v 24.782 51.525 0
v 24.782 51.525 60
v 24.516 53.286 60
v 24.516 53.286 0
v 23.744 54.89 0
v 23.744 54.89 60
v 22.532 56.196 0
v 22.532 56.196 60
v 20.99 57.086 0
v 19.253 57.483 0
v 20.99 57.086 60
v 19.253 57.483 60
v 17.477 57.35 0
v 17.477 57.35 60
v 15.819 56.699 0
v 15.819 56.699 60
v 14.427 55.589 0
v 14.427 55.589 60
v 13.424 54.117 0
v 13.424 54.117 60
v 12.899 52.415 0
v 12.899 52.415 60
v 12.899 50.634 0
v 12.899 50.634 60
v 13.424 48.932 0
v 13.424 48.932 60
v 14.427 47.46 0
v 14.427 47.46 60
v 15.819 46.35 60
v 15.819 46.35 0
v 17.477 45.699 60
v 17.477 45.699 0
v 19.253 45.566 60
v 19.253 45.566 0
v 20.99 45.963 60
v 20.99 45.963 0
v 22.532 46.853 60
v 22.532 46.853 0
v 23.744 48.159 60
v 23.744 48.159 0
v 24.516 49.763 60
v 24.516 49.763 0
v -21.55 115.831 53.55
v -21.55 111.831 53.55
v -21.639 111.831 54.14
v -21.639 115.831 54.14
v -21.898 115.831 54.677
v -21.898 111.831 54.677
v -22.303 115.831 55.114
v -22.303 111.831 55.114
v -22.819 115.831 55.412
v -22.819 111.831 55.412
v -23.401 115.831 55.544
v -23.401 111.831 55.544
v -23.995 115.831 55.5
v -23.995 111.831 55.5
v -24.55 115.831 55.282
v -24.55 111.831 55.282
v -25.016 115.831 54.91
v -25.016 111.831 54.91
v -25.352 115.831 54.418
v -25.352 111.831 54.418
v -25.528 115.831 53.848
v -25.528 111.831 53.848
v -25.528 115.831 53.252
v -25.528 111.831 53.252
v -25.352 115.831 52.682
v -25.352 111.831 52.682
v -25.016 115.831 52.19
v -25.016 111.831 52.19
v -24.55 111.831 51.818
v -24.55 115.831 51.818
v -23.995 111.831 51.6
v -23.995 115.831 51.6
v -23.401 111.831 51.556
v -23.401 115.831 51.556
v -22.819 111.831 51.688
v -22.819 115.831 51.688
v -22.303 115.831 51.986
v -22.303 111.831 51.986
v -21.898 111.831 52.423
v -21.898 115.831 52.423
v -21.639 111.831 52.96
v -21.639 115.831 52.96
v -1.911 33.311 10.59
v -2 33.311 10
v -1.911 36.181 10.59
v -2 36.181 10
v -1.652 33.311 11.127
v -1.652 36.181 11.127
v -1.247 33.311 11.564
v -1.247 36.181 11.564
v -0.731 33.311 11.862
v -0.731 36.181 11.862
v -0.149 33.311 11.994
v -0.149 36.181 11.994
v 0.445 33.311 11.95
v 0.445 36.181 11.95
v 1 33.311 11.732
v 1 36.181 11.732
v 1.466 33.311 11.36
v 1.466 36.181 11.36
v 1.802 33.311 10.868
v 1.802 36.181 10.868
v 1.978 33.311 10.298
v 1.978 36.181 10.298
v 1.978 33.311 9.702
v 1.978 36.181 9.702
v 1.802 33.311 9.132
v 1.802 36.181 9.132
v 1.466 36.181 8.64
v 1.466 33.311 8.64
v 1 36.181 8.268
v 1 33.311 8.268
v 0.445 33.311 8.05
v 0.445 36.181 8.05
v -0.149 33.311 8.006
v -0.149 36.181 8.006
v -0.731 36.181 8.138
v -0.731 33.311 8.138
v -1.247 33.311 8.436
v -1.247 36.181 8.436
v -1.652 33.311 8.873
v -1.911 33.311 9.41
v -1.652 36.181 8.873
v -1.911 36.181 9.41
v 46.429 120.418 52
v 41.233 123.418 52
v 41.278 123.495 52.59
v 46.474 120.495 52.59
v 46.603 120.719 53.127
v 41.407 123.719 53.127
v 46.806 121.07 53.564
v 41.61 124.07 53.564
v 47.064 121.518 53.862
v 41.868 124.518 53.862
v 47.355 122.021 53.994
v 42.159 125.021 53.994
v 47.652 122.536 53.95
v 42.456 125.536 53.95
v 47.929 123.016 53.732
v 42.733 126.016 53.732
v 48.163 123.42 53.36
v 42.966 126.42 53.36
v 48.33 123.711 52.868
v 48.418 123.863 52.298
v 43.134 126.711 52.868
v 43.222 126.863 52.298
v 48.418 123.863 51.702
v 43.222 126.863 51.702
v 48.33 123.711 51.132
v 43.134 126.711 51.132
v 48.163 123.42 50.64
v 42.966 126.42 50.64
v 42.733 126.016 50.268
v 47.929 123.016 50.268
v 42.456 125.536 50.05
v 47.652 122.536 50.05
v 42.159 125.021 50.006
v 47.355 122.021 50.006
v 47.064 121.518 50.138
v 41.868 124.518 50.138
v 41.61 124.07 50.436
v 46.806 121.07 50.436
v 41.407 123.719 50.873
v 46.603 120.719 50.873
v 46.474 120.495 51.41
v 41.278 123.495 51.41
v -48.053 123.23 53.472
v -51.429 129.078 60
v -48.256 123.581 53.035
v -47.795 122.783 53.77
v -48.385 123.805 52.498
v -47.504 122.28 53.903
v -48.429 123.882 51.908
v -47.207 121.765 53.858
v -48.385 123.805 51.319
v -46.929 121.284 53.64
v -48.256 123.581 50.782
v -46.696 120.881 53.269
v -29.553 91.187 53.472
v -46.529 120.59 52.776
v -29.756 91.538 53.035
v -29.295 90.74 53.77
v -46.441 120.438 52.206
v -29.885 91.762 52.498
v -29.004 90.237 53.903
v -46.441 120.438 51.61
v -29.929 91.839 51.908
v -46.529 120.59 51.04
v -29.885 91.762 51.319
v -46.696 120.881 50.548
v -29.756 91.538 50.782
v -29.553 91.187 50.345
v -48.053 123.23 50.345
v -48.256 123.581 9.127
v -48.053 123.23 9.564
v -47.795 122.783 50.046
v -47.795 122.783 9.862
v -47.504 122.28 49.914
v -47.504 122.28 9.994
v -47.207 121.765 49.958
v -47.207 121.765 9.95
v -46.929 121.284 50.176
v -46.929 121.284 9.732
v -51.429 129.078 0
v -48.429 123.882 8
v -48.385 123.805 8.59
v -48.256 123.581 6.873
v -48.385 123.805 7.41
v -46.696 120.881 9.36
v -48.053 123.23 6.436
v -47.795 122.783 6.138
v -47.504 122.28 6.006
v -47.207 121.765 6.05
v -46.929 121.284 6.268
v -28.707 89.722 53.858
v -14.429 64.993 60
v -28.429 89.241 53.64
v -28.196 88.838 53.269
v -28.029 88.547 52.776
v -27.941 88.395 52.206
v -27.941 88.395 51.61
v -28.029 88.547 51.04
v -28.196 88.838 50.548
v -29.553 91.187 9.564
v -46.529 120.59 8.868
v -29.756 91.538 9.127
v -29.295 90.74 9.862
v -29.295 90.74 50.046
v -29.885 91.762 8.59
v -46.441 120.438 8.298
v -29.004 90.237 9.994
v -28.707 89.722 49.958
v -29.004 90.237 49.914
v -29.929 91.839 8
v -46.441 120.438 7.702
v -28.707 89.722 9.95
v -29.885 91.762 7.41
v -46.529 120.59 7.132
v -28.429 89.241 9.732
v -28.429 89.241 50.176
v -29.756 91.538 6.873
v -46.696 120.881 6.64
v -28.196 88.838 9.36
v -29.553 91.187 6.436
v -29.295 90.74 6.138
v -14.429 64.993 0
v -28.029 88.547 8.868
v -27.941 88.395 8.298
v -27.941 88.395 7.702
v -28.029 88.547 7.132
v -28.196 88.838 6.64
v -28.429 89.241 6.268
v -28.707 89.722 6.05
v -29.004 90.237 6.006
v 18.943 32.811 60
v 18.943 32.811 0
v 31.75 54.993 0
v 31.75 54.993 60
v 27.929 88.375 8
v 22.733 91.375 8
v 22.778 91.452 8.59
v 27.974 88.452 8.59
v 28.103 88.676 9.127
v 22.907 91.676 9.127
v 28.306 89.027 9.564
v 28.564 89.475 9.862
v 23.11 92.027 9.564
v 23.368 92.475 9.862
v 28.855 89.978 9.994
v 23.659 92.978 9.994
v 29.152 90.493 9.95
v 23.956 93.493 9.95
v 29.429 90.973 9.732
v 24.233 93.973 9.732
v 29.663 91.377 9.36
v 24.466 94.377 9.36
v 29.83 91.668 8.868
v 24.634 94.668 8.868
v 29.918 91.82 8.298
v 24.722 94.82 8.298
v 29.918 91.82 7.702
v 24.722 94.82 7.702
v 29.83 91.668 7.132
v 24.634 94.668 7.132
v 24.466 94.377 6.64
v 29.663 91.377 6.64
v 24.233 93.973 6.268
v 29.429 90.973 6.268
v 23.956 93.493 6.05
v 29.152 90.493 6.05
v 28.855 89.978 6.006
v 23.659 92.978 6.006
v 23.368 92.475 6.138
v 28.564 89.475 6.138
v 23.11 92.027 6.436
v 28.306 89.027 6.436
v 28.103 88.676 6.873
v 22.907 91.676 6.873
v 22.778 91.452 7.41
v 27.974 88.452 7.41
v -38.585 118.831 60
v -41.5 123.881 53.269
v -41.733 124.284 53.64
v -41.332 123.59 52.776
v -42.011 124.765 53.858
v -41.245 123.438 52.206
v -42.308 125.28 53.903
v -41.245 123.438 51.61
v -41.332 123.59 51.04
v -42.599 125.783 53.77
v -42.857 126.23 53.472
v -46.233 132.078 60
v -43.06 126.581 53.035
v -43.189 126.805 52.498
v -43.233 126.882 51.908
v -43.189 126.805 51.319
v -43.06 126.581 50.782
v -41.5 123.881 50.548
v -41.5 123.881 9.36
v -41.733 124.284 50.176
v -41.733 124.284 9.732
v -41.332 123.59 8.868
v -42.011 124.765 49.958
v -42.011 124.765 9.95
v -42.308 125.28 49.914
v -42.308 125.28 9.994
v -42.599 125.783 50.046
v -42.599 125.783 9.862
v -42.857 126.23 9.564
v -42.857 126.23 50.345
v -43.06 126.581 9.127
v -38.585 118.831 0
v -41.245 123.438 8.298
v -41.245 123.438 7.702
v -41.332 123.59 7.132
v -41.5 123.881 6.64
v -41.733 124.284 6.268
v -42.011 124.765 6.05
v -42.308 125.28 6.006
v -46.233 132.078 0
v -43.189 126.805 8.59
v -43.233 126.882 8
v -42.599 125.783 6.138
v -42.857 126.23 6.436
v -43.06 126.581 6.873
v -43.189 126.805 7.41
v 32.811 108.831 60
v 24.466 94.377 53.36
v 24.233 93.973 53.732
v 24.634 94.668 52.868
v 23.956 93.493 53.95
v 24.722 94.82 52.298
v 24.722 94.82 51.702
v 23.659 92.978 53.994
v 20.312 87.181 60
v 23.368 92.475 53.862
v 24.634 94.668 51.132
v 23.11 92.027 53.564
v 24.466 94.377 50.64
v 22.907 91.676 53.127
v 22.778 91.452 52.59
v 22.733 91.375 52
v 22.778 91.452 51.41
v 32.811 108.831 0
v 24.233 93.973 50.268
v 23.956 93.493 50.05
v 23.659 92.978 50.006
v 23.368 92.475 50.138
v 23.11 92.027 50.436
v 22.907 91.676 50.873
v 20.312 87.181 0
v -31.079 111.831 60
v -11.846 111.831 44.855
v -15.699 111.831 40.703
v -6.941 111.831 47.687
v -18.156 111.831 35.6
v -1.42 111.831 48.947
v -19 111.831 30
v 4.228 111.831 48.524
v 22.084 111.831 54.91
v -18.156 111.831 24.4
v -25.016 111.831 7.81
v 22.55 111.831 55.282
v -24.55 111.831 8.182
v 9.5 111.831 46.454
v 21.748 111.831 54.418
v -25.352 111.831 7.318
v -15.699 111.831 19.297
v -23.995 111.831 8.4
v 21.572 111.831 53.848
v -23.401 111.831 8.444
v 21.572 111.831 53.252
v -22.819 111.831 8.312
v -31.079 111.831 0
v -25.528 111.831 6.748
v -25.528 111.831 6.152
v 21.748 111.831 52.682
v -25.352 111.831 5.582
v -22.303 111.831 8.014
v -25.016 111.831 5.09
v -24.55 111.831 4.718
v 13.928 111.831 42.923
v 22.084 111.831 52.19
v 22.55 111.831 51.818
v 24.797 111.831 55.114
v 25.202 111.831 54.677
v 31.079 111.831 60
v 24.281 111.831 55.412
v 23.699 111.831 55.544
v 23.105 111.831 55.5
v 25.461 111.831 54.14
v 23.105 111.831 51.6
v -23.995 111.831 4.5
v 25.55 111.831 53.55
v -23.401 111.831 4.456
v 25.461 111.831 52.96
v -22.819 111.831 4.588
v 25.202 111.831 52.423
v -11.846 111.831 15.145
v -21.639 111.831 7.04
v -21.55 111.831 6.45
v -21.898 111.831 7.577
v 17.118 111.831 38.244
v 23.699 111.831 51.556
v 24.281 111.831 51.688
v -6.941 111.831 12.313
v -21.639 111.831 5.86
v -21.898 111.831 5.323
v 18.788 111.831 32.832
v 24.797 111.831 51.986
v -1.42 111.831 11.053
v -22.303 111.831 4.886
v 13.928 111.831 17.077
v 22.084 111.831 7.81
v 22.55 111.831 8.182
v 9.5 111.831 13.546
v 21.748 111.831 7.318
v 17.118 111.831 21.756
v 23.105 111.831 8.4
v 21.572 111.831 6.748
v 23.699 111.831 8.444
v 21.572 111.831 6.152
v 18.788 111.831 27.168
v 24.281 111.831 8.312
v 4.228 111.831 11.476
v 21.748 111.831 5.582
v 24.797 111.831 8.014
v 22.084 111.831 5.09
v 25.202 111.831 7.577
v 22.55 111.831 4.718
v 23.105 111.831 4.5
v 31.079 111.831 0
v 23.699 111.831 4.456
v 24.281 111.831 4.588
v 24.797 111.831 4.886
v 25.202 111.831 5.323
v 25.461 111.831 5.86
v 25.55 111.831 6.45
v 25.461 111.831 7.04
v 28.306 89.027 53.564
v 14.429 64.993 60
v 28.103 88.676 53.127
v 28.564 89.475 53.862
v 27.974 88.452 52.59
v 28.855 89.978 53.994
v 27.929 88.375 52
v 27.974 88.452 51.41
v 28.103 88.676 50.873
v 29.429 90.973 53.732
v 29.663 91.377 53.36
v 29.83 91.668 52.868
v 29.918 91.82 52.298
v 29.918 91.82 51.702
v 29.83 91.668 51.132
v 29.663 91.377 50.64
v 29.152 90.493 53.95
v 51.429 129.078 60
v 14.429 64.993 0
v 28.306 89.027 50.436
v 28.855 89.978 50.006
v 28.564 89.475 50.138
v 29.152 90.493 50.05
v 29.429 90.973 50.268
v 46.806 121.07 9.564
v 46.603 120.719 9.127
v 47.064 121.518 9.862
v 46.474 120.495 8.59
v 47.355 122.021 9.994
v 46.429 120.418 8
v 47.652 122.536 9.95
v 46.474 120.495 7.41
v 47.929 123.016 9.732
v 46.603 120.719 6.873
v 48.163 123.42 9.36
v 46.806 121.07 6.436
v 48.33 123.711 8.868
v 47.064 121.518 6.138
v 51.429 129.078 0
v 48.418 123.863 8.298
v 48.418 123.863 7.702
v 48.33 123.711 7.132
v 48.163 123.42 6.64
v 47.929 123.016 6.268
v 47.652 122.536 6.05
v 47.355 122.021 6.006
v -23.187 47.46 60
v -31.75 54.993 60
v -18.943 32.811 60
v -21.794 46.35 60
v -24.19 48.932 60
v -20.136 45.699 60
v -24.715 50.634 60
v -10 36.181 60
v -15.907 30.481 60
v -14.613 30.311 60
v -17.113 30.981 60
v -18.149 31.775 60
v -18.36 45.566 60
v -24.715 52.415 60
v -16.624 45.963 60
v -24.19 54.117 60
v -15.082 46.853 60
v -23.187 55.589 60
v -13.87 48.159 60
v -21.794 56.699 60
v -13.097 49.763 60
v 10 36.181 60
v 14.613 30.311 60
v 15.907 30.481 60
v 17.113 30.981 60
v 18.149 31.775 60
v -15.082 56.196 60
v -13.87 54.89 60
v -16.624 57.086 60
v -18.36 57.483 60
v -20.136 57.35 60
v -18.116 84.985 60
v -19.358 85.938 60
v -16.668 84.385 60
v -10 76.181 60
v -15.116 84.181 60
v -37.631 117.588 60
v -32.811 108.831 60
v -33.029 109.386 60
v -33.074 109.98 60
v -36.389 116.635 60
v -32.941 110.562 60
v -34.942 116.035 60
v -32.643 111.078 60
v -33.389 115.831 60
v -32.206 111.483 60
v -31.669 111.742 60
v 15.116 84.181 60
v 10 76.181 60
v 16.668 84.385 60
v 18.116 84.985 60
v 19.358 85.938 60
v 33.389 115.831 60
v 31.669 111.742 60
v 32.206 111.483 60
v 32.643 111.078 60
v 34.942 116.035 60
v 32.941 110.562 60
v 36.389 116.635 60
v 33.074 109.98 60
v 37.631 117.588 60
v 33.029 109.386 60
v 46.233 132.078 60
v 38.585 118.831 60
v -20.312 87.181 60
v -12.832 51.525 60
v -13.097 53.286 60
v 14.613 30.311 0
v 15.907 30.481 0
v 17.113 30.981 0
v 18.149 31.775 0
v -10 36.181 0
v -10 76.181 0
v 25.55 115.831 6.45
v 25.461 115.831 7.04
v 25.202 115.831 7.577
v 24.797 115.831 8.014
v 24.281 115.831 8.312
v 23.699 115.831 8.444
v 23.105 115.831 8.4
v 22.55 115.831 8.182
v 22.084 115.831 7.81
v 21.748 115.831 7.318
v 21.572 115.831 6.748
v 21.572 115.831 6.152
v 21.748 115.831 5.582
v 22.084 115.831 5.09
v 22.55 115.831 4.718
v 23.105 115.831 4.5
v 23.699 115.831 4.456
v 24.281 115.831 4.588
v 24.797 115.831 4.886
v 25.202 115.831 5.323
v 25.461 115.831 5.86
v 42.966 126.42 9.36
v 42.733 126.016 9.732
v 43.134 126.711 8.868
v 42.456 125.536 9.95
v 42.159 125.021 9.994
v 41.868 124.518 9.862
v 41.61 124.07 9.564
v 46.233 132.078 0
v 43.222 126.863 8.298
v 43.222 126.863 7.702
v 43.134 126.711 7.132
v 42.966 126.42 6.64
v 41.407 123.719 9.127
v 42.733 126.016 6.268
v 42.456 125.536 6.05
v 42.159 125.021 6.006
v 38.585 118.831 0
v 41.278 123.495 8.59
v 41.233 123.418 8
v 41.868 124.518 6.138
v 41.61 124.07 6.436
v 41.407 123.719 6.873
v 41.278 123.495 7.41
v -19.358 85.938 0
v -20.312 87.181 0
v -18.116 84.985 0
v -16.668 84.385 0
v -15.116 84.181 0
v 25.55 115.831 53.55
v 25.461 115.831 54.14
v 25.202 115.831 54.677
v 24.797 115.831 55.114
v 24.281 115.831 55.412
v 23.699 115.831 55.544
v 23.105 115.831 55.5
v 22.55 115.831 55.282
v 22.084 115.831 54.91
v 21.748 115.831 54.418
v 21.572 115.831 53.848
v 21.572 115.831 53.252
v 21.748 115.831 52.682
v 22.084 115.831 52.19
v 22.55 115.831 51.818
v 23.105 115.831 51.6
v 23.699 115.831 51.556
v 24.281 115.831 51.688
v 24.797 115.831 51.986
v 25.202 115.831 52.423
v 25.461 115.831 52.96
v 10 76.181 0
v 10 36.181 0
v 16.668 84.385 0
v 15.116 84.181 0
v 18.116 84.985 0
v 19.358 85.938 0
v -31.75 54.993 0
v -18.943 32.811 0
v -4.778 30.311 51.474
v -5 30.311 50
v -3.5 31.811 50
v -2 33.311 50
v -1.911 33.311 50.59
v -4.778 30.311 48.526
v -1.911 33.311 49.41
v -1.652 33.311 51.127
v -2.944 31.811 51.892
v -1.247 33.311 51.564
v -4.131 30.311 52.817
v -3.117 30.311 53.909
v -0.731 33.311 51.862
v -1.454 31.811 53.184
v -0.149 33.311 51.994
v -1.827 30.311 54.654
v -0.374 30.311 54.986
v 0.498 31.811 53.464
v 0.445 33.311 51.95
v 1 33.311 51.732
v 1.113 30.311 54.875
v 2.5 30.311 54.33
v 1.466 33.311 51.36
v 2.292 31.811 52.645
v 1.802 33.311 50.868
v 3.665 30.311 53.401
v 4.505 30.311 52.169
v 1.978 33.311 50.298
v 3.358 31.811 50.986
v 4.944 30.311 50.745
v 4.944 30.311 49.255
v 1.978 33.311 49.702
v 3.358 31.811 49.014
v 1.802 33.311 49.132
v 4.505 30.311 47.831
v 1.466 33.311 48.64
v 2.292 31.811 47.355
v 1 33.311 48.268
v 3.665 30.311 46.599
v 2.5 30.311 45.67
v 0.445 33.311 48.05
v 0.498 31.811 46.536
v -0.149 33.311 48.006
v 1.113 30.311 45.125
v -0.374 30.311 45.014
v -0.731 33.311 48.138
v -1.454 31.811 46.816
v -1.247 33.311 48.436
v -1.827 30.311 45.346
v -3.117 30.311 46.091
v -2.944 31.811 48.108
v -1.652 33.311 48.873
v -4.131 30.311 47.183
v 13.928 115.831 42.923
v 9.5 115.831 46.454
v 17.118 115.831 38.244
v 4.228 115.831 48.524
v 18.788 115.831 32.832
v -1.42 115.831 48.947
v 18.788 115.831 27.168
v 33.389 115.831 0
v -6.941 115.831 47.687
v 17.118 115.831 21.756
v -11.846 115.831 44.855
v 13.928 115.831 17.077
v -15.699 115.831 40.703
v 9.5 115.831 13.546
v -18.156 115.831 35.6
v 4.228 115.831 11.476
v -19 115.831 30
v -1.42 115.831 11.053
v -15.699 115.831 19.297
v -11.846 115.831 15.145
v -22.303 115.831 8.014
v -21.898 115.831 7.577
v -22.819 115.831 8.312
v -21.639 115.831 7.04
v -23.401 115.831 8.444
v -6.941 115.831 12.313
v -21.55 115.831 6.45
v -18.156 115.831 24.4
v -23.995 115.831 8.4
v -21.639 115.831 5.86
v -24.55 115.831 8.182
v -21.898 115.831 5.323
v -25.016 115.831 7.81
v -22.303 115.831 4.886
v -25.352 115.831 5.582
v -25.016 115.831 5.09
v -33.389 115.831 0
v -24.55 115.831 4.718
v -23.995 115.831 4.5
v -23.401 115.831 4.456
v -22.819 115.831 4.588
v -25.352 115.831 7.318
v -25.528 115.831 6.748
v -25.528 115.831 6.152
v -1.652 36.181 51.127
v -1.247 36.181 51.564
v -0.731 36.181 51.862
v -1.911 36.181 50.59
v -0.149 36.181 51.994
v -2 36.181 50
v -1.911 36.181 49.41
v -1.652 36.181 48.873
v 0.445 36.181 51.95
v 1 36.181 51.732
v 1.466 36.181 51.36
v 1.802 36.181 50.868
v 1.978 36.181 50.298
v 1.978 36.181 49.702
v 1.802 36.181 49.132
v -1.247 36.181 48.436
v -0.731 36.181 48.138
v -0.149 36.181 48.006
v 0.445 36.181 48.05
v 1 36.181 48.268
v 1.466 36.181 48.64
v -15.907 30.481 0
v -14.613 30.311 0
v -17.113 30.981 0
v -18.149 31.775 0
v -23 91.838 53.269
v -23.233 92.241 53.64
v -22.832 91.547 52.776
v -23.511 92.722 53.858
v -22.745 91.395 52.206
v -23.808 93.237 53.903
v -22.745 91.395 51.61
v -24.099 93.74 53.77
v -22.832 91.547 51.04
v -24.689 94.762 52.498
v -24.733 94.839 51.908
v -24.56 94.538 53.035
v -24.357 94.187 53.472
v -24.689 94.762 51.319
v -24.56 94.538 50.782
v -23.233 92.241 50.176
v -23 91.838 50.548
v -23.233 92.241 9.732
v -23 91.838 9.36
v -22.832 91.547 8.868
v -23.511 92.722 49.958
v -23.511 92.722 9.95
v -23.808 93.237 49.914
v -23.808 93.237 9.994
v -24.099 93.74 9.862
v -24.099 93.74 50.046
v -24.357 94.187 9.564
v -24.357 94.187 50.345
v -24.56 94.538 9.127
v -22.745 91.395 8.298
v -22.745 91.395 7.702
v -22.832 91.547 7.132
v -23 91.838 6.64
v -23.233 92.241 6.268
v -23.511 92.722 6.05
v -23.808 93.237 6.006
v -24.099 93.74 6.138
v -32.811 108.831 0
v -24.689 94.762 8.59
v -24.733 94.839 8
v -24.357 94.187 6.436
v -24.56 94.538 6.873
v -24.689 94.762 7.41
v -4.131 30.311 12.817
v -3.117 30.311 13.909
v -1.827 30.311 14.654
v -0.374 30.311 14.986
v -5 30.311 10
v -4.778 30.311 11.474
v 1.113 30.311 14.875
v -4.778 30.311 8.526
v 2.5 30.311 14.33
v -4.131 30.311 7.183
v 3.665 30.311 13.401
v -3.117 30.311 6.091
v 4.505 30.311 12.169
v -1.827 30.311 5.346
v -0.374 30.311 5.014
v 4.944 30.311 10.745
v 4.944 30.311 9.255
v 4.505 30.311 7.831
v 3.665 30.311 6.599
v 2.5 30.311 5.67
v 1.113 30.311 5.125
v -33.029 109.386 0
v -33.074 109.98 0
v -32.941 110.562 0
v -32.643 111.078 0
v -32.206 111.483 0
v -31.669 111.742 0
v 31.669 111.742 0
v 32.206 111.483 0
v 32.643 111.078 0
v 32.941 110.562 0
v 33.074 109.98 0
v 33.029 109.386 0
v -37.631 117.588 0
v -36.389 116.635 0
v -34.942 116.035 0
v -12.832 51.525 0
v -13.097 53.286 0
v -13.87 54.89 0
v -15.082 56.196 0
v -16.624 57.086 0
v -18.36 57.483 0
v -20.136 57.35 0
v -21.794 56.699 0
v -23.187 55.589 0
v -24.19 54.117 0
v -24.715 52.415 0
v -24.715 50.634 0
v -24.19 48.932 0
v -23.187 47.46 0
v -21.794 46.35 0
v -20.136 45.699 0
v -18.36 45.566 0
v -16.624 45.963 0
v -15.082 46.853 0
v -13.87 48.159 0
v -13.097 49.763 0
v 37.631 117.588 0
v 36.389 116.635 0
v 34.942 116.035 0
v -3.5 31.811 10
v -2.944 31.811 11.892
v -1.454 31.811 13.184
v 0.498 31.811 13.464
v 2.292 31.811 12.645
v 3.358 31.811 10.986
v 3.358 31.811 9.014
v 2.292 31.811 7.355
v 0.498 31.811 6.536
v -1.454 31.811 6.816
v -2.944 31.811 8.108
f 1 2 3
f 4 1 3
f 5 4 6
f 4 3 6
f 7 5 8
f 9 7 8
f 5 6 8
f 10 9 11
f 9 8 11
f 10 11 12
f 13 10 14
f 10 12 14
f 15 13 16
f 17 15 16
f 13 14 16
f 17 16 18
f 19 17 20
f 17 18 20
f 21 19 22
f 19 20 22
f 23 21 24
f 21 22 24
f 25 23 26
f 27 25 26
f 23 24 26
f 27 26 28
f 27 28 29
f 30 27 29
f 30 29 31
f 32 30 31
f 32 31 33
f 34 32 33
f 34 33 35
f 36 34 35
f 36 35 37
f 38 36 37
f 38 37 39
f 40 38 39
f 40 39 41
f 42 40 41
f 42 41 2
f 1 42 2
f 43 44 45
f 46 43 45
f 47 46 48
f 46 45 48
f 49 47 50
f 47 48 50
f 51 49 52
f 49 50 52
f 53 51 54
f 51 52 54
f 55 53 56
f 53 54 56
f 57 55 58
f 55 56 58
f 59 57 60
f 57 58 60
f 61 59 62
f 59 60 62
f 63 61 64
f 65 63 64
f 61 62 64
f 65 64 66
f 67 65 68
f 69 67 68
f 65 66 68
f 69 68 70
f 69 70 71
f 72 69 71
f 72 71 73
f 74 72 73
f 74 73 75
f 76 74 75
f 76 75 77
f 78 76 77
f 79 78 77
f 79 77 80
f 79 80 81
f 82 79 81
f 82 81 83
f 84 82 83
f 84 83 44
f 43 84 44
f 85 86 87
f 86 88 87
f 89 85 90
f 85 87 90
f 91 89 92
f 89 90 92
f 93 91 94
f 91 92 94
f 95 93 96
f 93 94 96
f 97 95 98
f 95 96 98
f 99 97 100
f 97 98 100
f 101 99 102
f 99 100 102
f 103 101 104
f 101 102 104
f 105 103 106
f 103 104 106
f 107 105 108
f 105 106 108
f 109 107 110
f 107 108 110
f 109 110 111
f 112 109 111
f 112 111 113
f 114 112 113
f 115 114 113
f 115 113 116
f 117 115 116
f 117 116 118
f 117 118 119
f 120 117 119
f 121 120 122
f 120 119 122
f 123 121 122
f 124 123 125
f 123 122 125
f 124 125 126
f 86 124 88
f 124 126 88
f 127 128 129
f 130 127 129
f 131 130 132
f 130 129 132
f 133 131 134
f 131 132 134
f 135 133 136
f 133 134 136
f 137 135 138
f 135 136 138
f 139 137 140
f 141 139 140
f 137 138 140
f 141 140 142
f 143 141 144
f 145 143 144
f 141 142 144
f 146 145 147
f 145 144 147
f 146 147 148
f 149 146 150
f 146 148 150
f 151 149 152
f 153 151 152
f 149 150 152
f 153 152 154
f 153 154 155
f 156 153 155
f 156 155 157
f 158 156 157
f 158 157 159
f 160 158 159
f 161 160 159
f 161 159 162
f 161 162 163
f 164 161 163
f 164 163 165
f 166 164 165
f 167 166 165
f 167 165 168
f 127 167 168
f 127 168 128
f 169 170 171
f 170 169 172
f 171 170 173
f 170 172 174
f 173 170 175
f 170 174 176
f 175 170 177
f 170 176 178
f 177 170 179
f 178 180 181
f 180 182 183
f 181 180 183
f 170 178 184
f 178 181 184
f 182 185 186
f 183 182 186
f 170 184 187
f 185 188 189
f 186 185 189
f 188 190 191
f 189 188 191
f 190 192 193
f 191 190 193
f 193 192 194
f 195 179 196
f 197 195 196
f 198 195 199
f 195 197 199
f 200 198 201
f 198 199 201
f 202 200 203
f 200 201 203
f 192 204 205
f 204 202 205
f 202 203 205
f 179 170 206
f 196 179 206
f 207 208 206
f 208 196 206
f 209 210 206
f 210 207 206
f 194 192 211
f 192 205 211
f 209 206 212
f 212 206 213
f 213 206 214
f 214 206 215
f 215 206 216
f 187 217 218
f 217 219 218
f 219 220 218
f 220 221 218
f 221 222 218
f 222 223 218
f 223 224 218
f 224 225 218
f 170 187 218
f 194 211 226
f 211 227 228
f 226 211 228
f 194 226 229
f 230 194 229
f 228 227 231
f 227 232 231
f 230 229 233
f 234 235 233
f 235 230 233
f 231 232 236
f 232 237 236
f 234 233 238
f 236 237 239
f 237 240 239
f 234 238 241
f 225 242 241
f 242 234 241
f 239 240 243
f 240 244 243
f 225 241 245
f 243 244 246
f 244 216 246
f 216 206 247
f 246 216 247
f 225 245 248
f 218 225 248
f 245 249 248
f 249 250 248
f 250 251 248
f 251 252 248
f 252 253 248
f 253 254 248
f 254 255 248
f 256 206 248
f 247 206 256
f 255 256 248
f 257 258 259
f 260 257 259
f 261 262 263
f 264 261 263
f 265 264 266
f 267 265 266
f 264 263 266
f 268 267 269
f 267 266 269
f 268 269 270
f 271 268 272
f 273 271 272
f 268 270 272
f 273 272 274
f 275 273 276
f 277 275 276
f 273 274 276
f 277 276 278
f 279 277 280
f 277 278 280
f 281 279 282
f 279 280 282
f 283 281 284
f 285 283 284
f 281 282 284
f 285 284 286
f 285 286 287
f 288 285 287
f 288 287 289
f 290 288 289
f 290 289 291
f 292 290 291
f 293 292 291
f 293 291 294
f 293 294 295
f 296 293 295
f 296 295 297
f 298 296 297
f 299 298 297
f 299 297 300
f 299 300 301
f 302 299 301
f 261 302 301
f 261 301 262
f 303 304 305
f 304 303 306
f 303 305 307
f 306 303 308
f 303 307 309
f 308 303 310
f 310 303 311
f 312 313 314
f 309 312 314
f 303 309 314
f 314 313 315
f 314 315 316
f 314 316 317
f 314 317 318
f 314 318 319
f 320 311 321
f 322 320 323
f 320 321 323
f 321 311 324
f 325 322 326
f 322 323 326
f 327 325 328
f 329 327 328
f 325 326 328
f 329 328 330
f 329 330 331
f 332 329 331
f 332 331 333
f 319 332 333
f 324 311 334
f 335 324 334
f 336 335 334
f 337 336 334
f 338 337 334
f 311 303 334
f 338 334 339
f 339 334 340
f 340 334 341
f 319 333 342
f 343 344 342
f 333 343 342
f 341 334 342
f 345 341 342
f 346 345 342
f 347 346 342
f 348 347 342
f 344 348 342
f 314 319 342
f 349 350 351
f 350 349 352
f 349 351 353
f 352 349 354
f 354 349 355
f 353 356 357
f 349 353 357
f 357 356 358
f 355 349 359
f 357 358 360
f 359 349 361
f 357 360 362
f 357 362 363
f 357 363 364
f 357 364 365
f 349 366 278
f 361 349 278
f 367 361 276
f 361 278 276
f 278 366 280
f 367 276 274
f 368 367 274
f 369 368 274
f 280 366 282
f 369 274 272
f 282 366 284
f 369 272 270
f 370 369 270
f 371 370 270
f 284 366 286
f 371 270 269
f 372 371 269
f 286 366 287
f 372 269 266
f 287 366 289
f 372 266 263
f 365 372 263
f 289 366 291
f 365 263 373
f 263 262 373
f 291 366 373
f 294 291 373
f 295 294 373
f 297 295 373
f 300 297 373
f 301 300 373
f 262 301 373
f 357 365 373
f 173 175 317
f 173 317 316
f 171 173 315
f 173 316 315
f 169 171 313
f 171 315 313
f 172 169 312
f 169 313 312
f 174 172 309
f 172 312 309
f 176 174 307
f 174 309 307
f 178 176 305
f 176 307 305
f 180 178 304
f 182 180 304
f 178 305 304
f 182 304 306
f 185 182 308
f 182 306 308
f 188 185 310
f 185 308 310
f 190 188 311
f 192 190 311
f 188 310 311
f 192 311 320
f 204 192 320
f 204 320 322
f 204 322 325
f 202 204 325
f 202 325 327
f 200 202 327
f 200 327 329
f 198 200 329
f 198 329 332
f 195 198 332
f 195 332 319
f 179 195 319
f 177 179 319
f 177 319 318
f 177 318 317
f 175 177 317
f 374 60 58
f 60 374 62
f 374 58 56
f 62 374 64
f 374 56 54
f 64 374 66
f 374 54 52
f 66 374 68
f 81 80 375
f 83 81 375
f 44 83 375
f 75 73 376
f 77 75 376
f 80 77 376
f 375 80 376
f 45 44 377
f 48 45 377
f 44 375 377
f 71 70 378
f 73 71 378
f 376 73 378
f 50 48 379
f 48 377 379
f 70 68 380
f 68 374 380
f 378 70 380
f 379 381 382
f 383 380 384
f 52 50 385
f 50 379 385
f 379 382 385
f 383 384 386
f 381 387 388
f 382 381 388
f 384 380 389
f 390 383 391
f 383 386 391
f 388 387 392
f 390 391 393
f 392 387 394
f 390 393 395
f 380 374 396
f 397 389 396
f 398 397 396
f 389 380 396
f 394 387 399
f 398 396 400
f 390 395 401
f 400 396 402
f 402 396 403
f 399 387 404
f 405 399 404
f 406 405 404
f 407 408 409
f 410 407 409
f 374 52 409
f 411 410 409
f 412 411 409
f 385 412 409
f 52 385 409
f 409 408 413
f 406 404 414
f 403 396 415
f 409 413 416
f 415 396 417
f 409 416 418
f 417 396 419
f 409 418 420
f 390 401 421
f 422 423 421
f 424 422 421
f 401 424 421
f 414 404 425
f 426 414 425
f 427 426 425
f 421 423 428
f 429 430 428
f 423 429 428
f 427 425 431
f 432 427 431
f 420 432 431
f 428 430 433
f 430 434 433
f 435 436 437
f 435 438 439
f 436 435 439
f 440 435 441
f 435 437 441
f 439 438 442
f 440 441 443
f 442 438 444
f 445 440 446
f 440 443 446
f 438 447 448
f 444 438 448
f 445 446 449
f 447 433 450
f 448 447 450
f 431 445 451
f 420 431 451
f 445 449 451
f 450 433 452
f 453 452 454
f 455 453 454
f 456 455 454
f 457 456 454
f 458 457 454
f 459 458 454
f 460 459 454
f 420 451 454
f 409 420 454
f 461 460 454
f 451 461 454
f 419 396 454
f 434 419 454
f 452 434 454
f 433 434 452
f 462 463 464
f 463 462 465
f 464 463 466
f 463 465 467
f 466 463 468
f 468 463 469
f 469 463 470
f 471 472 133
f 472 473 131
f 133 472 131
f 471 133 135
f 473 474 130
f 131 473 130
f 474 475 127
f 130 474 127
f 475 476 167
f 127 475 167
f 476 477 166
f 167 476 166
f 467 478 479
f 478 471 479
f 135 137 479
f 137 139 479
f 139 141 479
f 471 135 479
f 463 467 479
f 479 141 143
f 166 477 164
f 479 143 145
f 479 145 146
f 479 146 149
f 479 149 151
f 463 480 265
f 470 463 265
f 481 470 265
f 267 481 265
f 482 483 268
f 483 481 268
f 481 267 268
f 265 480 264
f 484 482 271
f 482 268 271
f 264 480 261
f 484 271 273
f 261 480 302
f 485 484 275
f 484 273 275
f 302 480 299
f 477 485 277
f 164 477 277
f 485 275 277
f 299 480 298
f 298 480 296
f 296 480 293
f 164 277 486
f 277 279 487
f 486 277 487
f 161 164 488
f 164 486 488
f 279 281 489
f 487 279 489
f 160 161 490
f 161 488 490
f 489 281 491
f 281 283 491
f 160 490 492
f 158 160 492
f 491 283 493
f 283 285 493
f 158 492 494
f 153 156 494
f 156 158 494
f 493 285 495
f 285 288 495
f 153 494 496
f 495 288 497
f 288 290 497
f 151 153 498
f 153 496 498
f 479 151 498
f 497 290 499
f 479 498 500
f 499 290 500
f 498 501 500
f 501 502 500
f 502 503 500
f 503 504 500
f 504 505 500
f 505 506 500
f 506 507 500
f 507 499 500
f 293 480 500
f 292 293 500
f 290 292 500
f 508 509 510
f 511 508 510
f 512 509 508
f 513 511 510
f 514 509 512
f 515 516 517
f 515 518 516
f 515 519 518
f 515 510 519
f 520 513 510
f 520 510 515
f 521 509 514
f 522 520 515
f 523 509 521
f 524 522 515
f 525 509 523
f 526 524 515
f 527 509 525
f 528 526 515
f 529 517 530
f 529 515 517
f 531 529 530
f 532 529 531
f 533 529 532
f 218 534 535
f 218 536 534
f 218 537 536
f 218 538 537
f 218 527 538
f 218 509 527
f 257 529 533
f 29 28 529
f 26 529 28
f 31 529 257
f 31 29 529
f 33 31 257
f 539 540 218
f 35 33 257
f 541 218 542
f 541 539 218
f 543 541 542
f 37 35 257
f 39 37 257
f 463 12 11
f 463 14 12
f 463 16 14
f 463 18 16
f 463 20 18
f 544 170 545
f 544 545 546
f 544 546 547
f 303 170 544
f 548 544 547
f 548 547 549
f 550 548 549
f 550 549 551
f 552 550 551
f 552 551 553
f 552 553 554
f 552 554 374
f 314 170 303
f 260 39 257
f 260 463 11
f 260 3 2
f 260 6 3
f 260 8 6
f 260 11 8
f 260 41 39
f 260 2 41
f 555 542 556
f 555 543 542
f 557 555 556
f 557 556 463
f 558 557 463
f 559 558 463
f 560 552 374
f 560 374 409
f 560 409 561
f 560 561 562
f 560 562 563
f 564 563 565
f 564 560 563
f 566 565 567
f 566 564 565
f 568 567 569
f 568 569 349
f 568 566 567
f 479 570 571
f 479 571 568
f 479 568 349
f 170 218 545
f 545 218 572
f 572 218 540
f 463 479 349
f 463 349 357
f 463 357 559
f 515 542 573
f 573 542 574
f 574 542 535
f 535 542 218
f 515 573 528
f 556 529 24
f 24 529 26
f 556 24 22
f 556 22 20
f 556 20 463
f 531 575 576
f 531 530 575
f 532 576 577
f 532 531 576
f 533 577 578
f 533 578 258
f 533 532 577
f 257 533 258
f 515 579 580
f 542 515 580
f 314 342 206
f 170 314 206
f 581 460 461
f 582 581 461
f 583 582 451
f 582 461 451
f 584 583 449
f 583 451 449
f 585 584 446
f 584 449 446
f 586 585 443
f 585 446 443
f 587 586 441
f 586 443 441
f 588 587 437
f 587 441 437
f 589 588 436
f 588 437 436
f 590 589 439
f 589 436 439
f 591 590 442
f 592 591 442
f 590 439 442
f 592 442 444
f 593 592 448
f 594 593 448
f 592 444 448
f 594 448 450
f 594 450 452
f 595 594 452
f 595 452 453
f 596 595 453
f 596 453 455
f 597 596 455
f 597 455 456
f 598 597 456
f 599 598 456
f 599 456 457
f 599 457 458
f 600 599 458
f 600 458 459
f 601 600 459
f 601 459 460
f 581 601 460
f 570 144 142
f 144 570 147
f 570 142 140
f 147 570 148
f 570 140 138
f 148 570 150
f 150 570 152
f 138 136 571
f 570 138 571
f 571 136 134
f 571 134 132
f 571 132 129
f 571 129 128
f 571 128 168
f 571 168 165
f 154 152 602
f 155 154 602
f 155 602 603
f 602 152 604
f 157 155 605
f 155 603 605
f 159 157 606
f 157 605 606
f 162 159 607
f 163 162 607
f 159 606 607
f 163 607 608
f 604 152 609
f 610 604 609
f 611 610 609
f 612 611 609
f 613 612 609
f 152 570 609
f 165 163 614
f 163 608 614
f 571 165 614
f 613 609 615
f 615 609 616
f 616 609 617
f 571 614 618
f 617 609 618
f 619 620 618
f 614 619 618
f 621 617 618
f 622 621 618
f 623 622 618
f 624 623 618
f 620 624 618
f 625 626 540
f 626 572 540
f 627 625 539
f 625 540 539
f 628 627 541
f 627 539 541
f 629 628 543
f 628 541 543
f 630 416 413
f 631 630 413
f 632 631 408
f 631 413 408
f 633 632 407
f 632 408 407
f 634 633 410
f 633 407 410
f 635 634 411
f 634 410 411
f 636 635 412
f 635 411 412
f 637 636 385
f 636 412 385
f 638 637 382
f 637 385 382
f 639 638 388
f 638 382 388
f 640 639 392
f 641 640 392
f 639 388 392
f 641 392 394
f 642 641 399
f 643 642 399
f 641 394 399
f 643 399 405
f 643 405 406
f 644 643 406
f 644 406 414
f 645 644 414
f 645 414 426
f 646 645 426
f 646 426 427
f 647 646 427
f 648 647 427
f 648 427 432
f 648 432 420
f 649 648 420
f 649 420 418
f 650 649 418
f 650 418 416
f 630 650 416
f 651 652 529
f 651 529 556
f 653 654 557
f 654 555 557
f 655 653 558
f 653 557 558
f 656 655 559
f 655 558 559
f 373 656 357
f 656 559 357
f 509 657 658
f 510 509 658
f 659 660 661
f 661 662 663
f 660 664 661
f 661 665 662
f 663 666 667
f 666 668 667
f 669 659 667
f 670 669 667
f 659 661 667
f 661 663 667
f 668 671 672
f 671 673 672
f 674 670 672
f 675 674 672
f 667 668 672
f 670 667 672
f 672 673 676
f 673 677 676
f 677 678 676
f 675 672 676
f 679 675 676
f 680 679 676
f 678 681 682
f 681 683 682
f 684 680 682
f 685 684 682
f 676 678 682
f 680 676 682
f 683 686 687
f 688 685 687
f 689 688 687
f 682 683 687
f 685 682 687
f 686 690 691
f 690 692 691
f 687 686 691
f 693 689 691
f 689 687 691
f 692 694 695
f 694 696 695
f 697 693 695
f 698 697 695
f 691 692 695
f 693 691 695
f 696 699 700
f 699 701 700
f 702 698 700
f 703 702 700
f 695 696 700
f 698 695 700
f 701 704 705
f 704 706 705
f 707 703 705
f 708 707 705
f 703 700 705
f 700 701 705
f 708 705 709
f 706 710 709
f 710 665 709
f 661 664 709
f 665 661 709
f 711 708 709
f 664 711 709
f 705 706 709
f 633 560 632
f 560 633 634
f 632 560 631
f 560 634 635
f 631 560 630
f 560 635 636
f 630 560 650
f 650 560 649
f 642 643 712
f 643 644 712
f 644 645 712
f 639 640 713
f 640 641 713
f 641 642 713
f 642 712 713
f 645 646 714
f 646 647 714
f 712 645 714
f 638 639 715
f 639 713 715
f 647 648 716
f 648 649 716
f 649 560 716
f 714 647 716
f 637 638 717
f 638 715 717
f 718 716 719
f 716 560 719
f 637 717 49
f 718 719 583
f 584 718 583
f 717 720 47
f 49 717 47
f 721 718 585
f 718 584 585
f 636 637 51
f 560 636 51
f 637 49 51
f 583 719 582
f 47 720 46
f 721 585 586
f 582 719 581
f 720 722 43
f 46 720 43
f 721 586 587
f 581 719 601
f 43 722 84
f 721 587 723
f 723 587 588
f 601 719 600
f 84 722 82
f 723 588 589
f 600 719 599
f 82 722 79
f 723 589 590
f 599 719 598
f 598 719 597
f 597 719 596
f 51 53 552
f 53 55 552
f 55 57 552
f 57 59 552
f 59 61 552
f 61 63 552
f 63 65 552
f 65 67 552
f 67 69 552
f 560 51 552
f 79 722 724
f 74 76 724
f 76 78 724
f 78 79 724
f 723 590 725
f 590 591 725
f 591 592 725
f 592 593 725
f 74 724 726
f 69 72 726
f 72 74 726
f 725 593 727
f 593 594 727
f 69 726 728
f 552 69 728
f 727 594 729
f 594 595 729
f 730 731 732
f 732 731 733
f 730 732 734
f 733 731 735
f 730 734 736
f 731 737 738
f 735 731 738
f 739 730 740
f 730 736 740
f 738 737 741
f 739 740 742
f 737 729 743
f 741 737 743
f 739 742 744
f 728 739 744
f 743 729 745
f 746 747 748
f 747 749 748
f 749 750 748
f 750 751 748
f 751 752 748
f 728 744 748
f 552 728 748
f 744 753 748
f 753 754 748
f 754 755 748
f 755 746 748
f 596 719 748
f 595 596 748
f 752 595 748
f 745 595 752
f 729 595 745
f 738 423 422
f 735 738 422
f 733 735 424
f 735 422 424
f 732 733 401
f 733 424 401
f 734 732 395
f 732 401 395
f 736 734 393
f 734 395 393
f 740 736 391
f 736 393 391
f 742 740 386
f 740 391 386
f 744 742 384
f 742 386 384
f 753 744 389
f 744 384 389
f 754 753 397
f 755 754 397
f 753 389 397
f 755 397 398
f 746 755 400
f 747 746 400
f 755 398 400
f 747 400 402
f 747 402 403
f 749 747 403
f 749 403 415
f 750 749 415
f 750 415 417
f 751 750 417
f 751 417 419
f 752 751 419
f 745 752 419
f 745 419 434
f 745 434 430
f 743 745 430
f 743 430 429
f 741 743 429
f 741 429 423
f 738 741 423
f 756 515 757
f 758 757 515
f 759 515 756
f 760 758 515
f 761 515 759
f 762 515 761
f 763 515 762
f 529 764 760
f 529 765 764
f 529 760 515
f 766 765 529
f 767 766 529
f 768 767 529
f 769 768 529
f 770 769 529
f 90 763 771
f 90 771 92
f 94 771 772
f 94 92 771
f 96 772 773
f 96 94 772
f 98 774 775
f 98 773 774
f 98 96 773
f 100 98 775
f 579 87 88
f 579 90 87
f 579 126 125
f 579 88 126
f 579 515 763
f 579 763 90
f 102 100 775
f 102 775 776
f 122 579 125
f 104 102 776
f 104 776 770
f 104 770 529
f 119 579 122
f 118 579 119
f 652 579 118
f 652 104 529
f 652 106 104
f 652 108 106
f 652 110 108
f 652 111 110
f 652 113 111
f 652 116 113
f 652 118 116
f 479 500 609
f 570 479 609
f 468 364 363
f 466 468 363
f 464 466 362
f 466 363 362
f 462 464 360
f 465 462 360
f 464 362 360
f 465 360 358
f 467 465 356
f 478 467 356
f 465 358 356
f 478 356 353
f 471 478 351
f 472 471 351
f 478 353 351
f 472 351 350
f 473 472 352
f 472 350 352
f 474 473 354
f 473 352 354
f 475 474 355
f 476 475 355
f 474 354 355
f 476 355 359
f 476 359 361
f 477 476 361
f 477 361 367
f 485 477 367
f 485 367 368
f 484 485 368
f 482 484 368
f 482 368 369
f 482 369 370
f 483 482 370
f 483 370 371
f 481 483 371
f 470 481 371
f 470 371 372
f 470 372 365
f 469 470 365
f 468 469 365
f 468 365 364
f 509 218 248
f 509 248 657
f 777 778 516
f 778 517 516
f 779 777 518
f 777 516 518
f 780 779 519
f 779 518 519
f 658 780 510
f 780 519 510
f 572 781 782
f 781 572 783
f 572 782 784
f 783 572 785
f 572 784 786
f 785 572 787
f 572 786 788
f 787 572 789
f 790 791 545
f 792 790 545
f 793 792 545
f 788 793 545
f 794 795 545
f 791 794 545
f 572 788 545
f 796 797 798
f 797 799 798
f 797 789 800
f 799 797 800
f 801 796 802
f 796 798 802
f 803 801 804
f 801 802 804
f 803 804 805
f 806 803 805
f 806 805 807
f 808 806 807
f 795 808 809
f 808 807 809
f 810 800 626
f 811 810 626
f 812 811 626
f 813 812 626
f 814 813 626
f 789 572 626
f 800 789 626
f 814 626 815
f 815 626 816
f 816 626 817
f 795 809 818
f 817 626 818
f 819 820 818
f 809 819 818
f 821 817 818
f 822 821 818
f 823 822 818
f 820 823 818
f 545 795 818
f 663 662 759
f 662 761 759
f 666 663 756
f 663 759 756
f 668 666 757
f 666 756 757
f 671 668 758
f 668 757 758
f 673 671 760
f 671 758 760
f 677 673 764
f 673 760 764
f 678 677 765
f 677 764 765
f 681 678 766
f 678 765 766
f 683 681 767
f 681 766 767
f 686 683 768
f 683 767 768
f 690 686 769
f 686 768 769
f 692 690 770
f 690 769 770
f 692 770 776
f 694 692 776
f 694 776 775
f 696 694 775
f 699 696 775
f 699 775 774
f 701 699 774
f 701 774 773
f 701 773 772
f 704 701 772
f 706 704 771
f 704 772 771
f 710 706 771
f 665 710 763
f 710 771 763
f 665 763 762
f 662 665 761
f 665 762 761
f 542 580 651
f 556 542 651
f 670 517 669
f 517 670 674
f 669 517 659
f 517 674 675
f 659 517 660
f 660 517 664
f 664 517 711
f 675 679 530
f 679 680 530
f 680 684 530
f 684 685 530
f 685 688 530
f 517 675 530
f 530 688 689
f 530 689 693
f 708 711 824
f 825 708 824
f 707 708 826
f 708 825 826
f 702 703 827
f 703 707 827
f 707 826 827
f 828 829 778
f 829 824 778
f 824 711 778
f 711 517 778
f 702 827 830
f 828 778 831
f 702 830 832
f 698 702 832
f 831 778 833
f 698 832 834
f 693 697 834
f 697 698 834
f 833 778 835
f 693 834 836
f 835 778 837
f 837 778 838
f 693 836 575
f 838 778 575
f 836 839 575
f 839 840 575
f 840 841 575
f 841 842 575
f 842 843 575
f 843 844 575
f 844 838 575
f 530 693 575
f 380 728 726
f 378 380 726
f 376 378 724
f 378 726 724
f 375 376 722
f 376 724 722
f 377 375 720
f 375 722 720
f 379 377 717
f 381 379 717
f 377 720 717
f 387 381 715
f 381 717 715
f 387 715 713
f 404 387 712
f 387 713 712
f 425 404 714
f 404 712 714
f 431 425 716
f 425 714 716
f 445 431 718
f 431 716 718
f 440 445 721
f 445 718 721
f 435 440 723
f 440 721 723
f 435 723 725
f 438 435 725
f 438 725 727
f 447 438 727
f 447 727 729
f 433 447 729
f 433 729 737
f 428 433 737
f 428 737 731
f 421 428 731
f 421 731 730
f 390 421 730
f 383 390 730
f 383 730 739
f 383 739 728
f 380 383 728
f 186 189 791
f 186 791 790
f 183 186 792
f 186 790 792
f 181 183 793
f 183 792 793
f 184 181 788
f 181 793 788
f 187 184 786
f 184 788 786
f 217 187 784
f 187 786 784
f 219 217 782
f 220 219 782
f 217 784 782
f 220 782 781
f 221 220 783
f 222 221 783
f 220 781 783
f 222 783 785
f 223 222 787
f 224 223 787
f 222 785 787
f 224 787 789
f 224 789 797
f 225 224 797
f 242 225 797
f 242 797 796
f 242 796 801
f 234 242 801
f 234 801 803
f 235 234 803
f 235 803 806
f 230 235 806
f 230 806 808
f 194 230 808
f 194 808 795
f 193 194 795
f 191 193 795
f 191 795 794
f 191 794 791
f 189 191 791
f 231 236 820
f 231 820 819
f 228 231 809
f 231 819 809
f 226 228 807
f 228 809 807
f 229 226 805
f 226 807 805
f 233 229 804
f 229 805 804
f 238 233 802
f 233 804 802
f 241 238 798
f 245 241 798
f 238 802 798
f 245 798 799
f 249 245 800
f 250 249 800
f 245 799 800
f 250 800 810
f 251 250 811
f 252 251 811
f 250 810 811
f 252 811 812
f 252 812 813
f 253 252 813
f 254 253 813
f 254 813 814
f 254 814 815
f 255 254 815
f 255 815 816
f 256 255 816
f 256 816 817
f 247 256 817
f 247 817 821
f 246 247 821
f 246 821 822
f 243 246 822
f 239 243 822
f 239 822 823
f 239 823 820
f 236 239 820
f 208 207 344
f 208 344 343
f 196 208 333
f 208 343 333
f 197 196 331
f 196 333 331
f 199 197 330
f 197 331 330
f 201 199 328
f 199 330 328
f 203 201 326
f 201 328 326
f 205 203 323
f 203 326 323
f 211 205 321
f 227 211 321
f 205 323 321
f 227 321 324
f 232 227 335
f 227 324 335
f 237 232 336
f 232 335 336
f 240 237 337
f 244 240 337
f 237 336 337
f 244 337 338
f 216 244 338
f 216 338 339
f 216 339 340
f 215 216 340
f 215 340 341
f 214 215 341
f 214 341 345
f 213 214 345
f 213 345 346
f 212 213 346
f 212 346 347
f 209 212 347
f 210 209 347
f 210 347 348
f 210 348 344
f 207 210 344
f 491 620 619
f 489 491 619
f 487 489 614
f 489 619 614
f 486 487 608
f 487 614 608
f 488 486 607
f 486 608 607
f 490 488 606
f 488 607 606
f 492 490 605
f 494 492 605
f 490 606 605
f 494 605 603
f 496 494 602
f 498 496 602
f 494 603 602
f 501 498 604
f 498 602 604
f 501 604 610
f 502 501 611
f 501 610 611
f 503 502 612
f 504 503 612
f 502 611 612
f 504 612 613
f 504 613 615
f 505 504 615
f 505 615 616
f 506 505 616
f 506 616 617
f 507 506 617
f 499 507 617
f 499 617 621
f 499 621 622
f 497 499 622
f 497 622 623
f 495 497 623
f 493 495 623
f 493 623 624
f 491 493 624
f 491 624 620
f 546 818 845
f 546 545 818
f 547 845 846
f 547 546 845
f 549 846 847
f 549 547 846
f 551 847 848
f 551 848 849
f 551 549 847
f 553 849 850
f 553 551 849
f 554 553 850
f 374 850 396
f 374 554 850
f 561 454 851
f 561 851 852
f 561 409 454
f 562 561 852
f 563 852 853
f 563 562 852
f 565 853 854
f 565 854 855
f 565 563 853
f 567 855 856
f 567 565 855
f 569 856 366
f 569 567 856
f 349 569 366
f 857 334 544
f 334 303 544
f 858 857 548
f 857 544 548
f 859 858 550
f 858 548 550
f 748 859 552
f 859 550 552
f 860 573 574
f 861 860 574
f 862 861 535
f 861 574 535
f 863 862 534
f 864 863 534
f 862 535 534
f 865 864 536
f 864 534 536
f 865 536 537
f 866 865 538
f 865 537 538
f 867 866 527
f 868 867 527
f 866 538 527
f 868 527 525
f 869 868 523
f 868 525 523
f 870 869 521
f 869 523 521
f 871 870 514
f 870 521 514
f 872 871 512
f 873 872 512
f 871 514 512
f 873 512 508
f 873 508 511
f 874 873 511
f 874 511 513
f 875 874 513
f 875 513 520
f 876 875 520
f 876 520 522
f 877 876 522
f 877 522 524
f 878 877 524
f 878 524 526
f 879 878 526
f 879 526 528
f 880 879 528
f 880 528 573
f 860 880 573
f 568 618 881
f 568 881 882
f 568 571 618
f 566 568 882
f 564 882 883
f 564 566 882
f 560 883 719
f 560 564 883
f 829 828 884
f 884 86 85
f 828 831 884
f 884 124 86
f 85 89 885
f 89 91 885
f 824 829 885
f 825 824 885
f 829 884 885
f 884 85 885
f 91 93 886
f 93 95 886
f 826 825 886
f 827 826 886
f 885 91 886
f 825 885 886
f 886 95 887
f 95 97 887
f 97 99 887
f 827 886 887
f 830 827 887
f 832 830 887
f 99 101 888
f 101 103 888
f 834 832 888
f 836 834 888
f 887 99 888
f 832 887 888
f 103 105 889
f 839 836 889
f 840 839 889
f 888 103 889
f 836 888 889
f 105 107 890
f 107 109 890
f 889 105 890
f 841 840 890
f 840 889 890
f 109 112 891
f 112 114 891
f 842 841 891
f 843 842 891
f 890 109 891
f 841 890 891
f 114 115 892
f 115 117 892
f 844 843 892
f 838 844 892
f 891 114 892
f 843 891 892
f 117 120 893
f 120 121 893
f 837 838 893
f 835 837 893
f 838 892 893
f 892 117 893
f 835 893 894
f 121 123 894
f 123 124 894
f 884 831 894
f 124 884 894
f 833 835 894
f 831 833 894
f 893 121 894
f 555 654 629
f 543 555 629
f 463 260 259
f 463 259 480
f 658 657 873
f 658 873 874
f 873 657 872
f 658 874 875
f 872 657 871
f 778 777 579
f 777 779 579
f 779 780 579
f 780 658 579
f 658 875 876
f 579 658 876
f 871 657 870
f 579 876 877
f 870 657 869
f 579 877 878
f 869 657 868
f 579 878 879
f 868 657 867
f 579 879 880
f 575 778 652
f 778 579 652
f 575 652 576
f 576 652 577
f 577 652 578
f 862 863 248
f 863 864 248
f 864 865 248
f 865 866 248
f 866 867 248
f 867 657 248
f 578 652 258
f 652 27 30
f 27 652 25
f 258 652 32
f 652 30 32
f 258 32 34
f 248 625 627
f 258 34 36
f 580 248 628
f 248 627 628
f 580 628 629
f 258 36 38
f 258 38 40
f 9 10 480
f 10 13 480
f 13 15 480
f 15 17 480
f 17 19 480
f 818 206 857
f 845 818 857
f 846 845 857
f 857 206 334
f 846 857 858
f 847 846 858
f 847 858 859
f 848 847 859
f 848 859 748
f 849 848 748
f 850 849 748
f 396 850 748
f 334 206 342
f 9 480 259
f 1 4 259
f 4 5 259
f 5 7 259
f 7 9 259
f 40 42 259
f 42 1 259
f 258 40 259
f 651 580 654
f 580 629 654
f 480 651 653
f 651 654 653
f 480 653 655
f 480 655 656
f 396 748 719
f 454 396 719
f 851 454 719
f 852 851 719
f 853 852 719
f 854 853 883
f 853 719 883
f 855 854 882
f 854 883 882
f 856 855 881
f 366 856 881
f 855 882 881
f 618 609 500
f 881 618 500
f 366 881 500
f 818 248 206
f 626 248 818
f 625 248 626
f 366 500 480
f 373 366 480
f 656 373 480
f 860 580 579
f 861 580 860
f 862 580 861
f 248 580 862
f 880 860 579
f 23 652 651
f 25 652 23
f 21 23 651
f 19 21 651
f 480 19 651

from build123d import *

# Parameters (mm, degrees)
F0_W            = 20
F0_H            = 40
F1_DEPTH        = 60
F2_R            = 5
F3_R            = 6
F4_R            = 2
F5_R            = 5.975
F6_DEPTH        = 60.001
F8_D            = 4
F8_DEPTH        = 12
F8_TIP          = 1.2017212381
F9_R            = 19
F10_DEPTH       = 25
F12_D           = 4
F12_DEPTH       = 12
F12_TIP         = 1.2017212381
F14_D           = 4
F14_DEPTH       = 12
F14_TIP         = 1.2017212381
F16_D           = 4
F16_DEPTH       = 12
F16_CSINK_D     = 10
F16_CSINK_ANGLE = 90
F16_TIP         = 1.2017212381


with BuildPart() as f1:
    # F0 (on Top) → F1 (new body)
    with BuildSketch(Plane.XY):
        Polygon((-17.5, 30.3108891325), (17.5, 30.3108891325), (31.75, 54.9926131403), (14.4294919243, 64.9926131403), (51.4294919243, 129.0784930204), (46.2333395016, 132.0784930204), (36.8527810232, 115.8308891325), (-36.8527810232, 115.8308891325), (-46.2333395016, 132.0784930204), (-51.4294919243, 129.0784930204), (-14.4294919243, 64.9926131403), (-31.75, 54.9926131403), align=None)
        with Locations((0, 56.1808891325)):
            Rectangle(F0_W, F0_H, mode=Mode.SUBTRACT)
        Polygon((34.5433799465, 111.8308891325), (18.5796450034, 84.1808891325), (-18.5796450034, 84.1808891325), (-34.5433799465, 111.8308891325), align=None, mode=Mode.SUBTRACT)
    extrude(amount=F1_DEPTH)

    # F2
    f2_edges = [f1.edges().sort_by_distance(p)[0] for p in [
        (-17.5, 30.310889, 30),
        (17.5, 30.310889, 30),
    ]]
    fillet(f2_edges, radius=F2_R)

    # F3
    f3_edges = [f1.edges().sort_by_distance(p)[0] for p in [
        (18.579645, 84.180889, 30),
        (-18.579645, 84.180889, 30),
        (-36.852781, 115.830889, 30),
        (36.852781, 115.830889, 30),
    ]]
    fillet(f3_edges, radius=F3_R)

    # F4
    f4_edges = [f1.edges().sort_by_distance(p)[0] for p in [
        (34.54338, 111.830889, 30),
        (-34.54338, 111.830889, 30),
    ]]
    fillet(f4_edges, radius=F4_R)

    # F5 (on face) → F6 (cut, through all)
    with BuildSketch(Plane.XY.offset(60)):
        with Locations((-18.8069092991, 51.5245224395)):
            Circle(F5_R)
        with Locations((18.8069092991, 51.5245224395)):
            Circle(F5_R)
    extrude(amount=-F6_DEPTH, mode=Mode.SUBTRACT)

    # F8
    with Locations(Plane(origin=(0, 115.8308891325, 0), x_dir=(-1, 0, 0), z_dir=(0, 1, 0))):
        with Locations((-23.55, 53.55), (-23.55, 6.45), (23.55, 6.45), (23.55, 53.55)):
            Hole(F8_D / 2, depth=F8_DEPTH)
            with Locations((0, 0, -(F8_DEPTH + F8_TIP / 2))):  # 118° drill point
                Cone(0, F8_D / 2, F8_TIP, mode=Mode.SUBTRACT)

    # F9 (on face) → F10 (cut)
    with BuildSketch(Plane(origin=(0, 115.8308891325, 0), x_dir=(-1, 0, 0), z_dir=(0, 1, 0))):
        with Locations((0, 30)):
            Circle(F9_R)
    extrude(amount=-F10_DEPTH, mode=Mode.SUBTRACT)

    # F12
    with Locations(Plane(origin=(-17.3205080757, 10, 0), x_dir=(0.5, 0.8660254038, 0), z_dir=(0.8660254038, -0.5, 0))):
        with Locations((92.5, 52), (129.5, 52), (92.5, 8), (129.5, 8)):
            Hole(F12_D / 2, depth=F12_DEPTH)
            with Locations((0, 0, -(F12_DEPTH + F12_TIP / 2))):  # 118° drill point
                Cone(0, F12_D / 2, F12_TIP, mode=Mode.SUBTRACT)

    # F14
    with Locations(Plane(origin=(17.3205080757, 10, 0), x_dir=(0.5, -0.8660254038, 0), z_dir=(-0.8660254038, -0.5, 0))):
        with Locations((-92.5, 8), (-129.5, 8), (-92.5, 51.9081939641), (-129.5, 51.9081939641)):
            Hole(F14_D / 2, depth=F14_DEPTH)
            with Locations((0, 0, -(F14_DEPTH + F14_TIP / 2))):  # 118° drill point
                Cone(0, F14_D / 2, F14_TIP, mode=Mode.SUBTRACT)

    # F16
    with Locations(Plane.XZ.offset(-30.3108891325)):
        with Locations((0, 10), (0, 50)):
            CounterSinkHole(F16_D / 2, F16_CSINK_D / 2, depth=F16_DEPTH, counter_sink_angle=F16_CSINK_ANGLE)
            with Locations((0, 0, -(F16_DEPTH + F16_TIP / 2))):  # 118° drill point
                Cone(0, F16_D / 2, F16_TIP, mode=Mode.SUBTRACT)


solid = f1.part
